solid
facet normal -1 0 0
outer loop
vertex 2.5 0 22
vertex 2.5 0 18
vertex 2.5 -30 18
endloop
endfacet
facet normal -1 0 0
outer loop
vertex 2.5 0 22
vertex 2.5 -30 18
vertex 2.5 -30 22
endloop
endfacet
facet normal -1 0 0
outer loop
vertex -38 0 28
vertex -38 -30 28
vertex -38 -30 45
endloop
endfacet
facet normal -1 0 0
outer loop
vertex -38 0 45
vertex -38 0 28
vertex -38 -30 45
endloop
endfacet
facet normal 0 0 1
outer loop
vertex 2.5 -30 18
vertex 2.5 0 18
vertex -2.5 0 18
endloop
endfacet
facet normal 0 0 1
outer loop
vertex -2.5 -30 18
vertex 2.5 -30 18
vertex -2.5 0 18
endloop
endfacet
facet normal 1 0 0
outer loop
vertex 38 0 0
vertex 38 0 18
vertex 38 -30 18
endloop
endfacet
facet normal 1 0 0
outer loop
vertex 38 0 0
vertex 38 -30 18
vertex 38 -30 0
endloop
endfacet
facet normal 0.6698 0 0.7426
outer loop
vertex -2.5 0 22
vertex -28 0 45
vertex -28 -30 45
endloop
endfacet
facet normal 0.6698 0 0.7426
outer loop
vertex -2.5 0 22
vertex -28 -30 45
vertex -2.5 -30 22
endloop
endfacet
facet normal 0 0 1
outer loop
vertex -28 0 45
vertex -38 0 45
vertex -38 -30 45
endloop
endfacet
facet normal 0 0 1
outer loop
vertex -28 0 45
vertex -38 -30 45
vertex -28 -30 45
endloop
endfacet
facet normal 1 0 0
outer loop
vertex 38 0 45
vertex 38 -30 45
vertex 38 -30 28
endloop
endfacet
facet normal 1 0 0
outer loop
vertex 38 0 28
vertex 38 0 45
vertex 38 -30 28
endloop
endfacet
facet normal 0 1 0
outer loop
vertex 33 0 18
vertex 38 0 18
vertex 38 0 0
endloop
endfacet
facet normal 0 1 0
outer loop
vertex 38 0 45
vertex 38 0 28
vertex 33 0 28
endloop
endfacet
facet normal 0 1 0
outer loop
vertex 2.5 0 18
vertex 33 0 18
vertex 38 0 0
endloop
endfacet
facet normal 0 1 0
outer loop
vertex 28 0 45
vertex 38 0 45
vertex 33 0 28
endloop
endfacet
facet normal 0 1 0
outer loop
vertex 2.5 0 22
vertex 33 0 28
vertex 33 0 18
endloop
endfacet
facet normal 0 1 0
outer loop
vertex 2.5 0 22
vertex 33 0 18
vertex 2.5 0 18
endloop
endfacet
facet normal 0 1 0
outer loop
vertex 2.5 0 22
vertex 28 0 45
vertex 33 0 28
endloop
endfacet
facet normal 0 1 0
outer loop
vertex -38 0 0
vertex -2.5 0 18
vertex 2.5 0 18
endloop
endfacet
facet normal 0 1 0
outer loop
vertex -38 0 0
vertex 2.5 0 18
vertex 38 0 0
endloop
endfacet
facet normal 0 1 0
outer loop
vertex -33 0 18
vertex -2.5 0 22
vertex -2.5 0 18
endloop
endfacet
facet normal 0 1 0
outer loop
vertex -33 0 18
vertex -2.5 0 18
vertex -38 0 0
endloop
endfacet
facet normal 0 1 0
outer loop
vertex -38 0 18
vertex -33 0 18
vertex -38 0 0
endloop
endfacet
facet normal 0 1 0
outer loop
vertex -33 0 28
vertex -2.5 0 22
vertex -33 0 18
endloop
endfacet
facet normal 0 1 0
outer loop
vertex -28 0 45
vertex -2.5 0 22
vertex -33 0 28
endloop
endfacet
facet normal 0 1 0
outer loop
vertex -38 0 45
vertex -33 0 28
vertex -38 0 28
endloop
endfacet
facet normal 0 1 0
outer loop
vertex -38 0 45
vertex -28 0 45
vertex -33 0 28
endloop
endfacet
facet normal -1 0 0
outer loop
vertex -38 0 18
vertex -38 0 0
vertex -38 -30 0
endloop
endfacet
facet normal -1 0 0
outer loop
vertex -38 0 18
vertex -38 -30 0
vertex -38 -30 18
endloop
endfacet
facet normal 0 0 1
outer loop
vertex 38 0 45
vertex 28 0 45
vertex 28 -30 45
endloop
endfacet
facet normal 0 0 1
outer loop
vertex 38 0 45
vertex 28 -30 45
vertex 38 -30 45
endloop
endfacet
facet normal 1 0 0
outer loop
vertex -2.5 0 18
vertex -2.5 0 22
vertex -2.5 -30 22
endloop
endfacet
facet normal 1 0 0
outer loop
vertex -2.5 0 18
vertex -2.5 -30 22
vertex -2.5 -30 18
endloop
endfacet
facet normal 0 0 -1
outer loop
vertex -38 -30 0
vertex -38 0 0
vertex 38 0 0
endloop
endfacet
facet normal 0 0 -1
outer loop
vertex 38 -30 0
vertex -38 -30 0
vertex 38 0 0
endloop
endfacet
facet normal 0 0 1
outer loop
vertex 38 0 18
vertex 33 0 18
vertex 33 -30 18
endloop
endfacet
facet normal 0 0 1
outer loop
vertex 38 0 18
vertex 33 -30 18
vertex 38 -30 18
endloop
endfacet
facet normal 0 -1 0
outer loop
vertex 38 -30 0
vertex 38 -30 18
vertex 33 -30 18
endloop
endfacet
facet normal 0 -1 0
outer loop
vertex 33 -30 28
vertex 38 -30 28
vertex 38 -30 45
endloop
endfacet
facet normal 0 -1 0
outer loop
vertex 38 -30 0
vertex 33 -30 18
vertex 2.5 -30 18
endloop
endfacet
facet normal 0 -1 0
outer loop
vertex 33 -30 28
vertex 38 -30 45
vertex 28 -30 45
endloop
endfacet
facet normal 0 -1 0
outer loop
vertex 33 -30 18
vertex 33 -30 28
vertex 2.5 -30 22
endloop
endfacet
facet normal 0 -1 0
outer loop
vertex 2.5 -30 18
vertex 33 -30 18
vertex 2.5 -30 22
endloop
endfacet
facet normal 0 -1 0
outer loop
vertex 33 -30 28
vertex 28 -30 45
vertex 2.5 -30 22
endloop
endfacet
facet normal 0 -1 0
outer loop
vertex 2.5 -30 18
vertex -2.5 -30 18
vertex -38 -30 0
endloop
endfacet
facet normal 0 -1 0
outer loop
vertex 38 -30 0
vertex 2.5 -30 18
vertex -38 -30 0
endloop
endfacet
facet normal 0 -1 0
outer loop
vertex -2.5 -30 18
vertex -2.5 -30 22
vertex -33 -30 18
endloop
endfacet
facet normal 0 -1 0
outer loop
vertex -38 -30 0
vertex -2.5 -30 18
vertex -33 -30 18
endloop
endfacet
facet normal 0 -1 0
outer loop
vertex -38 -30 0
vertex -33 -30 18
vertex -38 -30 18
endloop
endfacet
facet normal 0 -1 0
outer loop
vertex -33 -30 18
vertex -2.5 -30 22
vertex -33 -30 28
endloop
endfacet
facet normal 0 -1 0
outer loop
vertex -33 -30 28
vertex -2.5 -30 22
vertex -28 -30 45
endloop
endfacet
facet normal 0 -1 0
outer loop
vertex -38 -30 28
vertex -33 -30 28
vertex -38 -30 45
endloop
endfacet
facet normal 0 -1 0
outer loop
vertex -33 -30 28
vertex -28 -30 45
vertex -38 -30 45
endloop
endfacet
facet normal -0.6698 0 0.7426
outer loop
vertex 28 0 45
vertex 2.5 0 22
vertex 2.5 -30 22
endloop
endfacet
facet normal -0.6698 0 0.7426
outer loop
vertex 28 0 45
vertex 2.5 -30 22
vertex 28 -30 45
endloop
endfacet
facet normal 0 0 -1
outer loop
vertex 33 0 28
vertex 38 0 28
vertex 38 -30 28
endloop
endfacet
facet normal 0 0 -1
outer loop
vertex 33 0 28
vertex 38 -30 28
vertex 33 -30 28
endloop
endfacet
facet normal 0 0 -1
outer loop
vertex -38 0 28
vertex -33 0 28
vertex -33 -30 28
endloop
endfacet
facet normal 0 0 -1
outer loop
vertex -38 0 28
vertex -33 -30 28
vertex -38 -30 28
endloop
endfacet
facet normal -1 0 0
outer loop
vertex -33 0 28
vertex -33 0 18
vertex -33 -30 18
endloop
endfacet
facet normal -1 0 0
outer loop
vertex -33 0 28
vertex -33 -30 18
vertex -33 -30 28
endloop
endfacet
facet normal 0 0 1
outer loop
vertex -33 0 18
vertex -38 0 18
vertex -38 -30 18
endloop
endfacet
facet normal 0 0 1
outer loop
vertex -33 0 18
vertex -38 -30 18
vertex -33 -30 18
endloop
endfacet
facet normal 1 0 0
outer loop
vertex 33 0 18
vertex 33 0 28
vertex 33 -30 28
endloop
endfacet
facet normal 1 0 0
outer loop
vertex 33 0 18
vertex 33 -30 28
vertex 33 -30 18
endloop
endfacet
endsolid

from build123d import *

# Parameters (mm, degrees)
PAD_DEPTH = 30


with BuildPart() as part:
    # Sketch → Pad (new body)
    with BuildSketch(Plane.XZ):
        Polygon((0, 0), (-38, 0), (-38, 18), (-33, 18), (-33, 28), (-38, 28), (-38, 45), (-28, 45), (-2.5, 22), (-2.5, 18), (0, 18), (2.5, 18), (2.5, 22), (28, 45), (38, 45), (38, 28), (33, 28), (33, 18), (38, 18), (38, 0), align=None)
    extrude(amount=PAD_DEPTH)


solid = part.part
